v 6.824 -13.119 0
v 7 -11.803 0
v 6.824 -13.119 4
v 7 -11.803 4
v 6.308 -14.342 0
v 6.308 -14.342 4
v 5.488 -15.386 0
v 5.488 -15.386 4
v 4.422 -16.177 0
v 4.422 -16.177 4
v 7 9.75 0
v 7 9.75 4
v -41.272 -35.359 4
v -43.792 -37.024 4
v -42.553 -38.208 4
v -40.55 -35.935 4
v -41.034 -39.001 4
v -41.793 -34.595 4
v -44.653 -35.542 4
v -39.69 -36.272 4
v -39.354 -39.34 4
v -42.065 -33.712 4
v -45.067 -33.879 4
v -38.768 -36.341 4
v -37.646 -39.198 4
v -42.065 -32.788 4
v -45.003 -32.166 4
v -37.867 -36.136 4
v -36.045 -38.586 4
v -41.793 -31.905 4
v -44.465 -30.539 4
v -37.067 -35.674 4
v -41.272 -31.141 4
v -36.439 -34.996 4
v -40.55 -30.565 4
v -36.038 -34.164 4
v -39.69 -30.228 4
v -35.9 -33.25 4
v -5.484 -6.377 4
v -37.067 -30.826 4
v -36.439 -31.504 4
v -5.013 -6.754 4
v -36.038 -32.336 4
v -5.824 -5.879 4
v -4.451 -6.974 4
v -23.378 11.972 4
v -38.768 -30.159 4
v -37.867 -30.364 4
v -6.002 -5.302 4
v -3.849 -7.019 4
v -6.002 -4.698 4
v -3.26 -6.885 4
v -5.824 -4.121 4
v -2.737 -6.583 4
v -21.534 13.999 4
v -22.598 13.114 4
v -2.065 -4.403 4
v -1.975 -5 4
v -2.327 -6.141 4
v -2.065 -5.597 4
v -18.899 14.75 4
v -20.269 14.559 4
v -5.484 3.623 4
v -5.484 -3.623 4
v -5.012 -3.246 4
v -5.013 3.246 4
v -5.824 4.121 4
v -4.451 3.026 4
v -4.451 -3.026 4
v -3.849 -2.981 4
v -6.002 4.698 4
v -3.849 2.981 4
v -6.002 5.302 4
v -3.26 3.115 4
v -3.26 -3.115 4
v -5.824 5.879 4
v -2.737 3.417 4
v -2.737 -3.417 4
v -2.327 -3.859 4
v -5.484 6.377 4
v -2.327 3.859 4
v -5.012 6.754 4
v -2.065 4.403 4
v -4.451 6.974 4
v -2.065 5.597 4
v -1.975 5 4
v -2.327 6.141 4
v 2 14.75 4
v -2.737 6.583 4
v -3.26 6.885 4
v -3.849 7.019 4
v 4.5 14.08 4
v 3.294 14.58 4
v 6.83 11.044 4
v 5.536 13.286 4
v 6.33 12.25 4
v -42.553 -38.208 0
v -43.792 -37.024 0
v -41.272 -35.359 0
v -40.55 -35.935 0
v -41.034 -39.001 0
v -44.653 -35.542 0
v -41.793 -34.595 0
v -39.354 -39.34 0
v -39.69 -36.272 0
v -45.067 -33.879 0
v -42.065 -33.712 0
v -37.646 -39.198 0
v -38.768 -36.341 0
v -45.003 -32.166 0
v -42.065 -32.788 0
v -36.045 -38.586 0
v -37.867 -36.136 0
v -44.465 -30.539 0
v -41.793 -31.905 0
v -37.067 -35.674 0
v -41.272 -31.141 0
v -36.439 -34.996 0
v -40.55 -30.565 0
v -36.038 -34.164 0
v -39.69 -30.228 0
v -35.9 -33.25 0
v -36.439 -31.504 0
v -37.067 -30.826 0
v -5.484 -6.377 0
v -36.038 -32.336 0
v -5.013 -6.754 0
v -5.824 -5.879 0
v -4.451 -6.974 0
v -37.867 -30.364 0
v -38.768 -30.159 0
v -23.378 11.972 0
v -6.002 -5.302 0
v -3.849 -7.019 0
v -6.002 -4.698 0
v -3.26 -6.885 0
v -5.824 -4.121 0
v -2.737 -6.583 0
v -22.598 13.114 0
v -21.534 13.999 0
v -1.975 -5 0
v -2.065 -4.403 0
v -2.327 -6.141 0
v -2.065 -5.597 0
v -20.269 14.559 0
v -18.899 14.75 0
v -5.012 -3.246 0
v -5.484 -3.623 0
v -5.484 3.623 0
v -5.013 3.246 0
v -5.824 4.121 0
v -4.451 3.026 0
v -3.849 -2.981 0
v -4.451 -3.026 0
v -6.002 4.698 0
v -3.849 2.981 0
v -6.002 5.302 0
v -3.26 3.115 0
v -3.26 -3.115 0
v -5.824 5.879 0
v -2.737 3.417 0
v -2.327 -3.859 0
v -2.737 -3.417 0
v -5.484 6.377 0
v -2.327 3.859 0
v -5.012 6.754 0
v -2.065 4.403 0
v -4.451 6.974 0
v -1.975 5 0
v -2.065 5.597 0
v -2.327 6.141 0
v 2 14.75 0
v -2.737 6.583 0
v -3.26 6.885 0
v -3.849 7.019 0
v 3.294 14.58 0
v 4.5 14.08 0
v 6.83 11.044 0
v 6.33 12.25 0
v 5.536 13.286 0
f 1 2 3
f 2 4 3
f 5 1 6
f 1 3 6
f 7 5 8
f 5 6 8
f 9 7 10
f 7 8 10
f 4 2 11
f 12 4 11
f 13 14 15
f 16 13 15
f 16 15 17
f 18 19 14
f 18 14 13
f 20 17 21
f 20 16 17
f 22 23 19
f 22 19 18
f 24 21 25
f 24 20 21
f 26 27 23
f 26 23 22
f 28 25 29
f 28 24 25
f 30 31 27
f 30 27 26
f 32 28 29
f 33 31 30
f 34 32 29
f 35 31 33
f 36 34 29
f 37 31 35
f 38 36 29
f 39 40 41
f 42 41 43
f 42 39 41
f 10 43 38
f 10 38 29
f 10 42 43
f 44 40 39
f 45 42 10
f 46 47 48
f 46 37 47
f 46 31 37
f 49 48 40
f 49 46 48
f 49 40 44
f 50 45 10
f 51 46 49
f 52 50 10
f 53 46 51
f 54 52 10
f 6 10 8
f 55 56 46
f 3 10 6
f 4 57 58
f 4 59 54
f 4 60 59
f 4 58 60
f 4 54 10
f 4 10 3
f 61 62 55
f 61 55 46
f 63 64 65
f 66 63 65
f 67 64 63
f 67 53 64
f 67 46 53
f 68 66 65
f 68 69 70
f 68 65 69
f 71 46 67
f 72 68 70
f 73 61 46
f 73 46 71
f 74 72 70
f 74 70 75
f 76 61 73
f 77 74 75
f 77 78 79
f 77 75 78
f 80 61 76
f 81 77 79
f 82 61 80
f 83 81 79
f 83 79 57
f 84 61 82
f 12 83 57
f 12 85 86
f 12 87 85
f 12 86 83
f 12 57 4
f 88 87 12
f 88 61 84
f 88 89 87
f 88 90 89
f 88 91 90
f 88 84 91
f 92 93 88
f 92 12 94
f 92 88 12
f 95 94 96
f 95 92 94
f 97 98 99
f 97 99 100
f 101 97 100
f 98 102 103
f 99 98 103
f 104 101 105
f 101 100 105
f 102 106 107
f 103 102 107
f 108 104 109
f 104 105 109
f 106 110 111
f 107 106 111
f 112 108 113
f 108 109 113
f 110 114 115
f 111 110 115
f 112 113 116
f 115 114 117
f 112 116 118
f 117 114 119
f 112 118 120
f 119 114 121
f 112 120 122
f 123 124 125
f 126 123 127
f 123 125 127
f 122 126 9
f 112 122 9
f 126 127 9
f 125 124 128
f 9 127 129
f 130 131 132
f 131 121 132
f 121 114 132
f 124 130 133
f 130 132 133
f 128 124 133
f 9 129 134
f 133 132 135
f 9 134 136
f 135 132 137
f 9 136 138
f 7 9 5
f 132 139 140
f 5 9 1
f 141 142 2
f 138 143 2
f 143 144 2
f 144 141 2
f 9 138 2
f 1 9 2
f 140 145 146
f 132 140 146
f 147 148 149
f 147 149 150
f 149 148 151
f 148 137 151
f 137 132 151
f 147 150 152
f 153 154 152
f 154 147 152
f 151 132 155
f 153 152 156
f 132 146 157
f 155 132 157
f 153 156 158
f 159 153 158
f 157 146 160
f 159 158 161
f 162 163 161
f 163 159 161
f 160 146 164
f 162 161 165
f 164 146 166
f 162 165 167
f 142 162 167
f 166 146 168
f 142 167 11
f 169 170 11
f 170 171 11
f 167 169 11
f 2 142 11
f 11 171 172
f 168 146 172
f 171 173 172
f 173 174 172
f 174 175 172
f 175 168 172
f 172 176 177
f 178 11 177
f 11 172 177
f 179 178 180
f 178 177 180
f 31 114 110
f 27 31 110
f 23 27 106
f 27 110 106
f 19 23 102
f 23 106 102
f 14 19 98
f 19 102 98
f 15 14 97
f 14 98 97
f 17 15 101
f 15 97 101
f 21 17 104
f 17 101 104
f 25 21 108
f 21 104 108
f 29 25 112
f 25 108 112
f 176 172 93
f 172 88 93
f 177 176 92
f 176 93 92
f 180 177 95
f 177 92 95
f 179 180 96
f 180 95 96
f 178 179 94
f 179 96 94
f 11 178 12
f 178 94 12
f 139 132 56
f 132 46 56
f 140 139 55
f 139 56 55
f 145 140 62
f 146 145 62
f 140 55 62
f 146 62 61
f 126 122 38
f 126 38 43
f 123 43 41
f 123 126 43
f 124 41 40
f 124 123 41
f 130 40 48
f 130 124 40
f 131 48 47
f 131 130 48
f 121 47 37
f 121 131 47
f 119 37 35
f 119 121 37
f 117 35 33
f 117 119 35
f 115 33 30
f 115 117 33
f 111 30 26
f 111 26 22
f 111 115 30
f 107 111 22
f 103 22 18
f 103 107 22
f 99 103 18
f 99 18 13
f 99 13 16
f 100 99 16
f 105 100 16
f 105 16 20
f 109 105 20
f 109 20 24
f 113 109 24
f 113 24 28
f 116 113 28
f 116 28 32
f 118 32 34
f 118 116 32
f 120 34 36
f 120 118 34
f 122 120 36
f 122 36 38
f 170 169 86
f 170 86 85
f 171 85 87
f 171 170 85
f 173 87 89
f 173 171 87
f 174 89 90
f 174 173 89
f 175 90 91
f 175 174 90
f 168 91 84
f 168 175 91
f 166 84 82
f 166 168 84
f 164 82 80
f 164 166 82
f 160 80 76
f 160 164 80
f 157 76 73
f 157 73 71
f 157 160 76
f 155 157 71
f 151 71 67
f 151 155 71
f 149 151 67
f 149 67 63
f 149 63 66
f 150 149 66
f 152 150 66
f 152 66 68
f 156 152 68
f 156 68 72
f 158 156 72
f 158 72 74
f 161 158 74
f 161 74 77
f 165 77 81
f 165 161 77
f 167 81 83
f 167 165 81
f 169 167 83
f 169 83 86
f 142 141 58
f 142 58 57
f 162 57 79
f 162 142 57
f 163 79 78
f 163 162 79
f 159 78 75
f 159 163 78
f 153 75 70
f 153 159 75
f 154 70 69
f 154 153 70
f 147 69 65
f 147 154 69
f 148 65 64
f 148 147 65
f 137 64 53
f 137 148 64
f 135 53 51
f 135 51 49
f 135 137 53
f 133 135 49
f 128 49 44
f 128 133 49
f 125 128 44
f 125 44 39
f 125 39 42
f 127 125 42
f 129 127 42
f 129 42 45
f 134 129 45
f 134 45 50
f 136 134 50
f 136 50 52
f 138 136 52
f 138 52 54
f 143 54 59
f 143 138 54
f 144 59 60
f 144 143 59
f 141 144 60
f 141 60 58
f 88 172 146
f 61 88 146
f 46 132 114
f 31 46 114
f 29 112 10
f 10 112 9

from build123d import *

# Parameters (mm, degrees)
SKETCH_2_R      = 2.025
SKETCH_2_R_2    = 3.1
EXTRUDE_1_DEPTH = 4
FILLET_1_R      = 5


with BuildPart() as part:
    # 草图2 → 凸台-拉伸1 (new body)
    with BuildSketch(Plane.XY):
        with BuildLine():
            Line((-22, 14.75), (-44.464667105, -30.539388734))
            ThreePointArc((-44.464667105, -30.539388734), (-43.214642655, -37.659851164), (-36.044914585, -38.586428599))
            Line((-36.044914585, -38.586428599), (7, -14.75))
            Line((7, -14.75), (7, 14.75))
            Line((7, 14.75), (-22, 14.75))
        make_face()
        with Locations((-4, 5)):
            Circle(SKETCH_2_R, mode=Mode.SUBTRACT)
        with Locations((-4, -5)):
            Circle(SKETCH_2_R, mode=Mode.SUBTRACT)
        with Locations((-39, -33.25)):
            Circle(SKETCH_2_R_2, mode=Mode.SUBTRACT)
    extrude(amount=EXTRUDE_1_DEPTH)

    # 圆角1
    fillet_1_edges = [part.edges().sort_by_distance(p)[0] for p in [
        (-22, 14.75, 2),
        (7, 14.75, 2),
        (7, -14.75, 2),
    ]]
    fillet(fillet_1_edges, radius=FILLET_1_R)


solid = part.part
